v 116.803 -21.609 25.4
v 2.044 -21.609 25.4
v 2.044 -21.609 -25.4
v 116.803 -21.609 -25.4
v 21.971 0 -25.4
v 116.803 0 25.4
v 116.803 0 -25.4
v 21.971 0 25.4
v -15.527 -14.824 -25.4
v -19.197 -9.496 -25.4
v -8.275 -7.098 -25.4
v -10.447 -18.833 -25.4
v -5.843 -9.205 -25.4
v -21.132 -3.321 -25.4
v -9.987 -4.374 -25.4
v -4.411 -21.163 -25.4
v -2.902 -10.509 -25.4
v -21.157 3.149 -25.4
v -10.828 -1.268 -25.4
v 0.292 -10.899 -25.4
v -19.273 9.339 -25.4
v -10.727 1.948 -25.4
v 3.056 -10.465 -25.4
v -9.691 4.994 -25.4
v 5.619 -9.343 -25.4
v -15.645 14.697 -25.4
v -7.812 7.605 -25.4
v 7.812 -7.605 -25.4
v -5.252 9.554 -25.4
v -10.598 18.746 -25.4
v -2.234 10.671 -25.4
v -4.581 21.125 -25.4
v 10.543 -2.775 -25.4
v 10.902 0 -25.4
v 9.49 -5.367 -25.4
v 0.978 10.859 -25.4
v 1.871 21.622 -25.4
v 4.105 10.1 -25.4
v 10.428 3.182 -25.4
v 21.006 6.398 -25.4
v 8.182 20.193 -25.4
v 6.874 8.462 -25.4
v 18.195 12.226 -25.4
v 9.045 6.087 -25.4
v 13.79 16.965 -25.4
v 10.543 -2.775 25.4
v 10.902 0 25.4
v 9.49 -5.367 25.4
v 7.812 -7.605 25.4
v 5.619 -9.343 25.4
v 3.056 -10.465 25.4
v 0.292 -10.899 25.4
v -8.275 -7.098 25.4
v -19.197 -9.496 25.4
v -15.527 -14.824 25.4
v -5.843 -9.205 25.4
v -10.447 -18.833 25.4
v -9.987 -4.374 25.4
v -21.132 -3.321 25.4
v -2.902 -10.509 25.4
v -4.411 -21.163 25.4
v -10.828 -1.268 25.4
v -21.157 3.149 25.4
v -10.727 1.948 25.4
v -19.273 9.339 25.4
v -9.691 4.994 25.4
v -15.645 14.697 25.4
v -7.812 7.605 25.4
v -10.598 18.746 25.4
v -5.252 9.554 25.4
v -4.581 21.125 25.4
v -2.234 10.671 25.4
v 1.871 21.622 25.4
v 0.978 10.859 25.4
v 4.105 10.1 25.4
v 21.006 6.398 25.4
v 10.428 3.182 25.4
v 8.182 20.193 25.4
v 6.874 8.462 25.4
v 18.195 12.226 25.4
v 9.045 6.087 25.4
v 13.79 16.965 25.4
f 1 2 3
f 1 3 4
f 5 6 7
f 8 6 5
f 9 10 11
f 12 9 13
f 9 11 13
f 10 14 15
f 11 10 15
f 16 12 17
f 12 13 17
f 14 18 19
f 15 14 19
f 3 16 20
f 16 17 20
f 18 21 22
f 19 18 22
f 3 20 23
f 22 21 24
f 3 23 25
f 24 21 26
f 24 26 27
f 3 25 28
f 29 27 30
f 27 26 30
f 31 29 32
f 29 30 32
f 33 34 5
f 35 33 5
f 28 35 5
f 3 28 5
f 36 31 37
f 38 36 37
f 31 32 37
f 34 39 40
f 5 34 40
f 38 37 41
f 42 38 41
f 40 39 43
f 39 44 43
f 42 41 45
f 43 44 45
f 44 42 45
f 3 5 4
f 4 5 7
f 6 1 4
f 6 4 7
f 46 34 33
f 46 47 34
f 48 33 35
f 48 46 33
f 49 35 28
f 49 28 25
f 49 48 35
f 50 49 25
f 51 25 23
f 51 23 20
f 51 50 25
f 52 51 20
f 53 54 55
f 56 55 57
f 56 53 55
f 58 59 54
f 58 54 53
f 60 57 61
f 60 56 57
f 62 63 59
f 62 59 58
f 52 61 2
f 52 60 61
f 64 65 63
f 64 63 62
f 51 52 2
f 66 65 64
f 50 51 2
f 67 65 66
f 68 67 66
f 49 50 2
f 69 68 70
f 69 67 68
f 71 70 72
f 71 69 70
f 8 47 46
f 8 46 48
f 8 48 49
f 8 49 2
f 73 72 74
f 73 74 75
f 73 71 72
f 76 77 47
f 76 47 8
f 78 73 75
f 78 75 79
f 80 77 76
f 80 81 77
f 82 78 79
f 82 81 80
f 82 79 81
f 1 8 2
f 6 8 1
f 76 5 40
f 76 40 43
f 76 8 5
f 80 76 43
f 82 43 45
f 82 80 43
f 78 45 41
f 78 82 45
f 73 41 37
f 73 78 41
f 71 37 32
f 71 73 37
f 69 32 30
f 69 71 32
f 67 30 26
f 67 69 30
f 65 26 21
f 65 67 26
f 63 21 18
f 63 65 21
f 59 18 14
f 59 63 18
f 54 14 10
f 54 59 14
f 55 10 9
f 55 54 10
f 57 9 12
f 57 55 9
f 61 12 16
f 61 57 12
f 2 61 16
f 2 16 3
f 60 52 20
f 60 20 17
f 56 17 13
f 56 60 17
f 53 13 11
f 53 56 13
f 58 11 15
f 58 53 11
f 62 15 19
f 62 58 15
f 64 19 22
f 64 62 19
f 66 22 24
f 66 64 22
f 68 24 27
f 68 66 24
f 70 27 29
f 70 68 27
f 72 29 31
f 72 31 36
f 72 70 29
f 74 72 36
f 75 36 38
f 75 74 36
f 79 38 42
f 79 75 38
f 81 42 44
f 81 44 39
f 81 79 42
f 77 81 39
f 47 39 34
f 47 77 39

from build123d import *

# Parameters (mm, degrees)
F1_DEPTH = 25.4


with BuildPart() as f1:
    # F0 (on Top) → F1 (new body, symmetric)
    with BuildSketch(Plane.XY):
        with BuildLine():
            Line((21.971458, 0), (10.902476, 0))
            ThreePointArc((10.902476, 0), (7.811772, -7.605275), (0.292004, -10.898565))
            Line((0.292004, -10.898565), (0.292004, -21.608541))
            Line((0.292004, -21.608541), (2.044055, -21.608541))
            ThreePointArc((2.044055, -21.608541), (16.229103, -14.697197), (21.971458, 0))
        make_face()
        with BuildLine():
            ThreePointArc((0.292004, -10.898565), (-7.811772, 7.605275), (10.902476, 0))
            Line((10.902476, 0), (21.971458, 0))
            ThreePointArc((21.971458, 0), (-15.645094, 14.697197), (2.044055, -21.608541))
            Line((2.044055, -21.608541), (0.292004, -21.608541))
            Line((0.292004, -21.608541), (0.292004, -10.898565))
        make_face()
        with BuildLine():
            Line((116.802923, 0), (21.971458, 0))
            ThreePointArc((21.971458, 0), (16.229103, -14.697197), (2.044055, -21.608541))
            Line((2.044055, -21.608541), (116.802923, -21.608541))
            Line((116.802923, -21.608541), (116.802923, 0))
        make_face()
    extrude(amount=F1_DEPTH, both=True)


solid = f1.part
